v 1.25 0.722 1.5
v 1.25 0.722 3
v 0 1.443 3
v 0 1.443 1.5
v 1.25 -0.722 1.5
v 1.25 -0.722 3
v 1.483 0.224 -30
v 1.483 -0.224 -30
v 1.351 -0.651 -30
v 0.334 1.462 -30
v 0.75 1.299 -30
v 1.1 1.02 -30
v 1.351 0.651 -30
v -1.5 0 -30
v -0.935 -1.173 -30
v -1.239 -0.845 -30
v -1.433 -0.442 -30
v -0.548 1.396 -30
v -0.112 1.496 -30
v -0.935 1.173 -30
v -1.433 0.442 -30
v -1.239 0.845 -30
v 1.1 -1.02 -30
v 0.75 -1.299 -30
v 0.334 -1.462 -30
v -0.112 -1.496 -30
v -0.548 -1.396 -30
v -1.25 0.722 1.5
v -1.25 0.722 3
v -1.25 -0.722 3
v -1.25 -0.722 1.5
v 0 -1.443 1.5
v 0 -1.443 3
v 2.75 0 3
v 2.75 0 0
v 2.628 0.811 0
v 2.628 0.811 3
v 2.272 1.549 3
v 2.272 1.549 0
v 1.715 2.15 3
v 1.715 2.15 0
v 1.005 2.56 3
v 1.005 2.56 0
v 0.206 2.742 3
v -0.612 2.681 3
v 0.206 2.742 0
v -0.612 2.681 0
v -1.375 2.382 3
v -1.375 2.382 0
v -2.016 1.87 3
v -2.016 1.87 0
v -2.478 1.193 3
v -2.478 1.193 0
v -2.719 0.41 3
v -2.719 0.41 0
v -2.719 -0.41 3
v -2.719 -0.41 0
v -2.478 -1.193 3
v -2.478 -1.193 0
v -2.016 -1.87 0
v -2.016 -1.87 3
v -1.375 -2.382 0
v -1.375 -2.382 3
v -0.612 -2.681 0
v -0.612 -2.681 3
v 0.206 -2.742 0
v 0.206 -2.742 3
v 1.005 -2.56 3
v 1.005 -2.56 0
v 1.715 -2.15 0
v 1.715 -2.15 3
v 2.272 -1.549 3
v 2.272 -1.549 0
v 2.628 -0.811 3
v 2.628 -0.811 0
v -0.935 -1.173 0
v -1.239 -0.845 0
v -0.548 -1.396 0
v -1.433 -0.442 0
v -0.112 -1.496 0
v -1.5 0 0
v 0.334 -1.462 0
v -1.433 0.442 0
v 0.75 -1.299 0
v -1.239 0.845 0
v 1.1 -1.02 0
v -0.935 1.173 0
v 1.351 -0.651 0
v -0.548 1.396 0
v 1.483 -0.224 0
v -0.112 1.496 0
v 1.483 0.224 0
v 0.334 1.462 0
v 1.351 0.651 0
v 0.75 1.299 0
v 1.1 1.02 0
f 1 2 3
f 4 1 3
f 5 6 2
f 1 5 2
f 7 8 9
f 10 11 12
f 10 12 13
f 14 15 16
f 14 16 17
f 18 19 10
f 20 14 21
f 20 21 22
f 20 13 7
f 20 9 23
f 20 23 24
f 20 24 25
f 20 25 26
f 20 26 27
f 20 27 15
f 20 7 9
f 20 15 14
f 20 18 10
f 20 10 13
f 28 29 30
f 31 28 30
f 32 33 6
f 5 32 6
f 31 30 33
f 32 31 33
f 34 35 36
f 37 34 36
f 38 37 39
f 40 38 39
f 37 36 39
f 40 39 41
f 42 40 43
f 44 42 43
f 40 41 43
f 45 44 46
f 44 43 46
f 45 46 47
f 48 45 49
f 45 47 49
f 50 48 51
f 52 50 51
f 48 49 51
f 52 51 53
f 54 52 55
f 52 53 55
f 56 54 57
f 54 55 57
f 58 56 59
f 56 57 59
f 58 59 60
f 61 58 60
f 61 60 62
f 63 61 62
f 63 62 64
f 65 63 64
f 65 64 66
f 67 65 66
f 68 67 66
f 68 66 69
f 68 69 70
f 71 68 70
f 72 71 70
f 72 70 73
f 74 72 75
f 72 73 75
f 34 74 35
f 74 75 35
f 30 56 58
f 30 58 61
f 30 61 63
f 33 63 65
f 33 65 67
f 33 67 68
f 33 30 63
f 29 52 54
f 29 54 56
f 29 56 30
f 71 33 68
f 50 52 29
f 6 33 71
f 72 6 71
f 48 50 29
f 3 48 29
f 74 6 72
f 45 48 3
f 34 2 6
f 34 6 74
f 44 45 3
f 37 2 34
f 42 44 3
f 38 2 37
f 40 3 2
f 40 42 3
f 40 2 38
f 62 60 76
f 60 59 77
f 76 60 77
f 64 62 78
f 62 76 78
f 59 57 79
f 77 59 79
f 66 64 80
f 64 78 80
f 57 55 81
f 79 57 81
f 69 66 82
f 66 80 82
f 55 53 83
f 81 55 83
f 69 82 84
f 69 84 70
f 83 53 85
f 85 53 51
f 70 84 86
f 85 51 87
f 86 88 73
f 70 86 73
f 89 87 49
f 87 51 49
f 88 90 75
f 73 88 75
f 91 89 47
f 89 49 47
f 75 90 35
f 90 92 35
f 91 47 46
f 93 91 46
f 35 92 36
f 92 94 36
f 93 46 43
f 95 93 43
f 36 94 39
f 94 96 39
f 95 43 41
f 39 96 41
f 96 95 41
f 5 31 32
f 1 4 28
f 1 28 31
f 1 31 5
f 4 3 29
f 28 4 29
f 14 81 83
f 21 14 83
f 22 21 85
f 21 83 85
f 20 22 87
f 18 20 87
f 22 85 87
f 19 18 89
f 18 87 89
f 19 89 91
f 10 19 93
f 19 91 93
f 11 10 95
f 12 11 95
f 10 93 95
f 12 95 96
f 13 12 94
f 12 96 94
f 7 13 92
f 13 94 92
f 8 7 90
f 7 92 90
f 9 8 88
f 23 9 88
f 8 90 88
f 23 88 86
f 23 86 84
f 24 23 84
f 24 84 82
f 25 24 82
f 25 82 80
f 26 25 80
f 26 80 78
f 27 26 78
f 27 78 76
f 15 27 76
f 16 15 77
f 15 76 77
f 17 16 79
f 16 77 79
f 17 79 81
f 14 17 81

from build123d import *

# Parameters (mm, degrees)
SKETCH_1_R          = 2.75
EXTRUDE_1_DEPTH     = 3
CUT_EXTRUDE_1_DEPTH = 1.5
SKETCH_3_R          = 1.5
EXTRUDE_2_DEPTH     = 30


with BuildPart() as part:
    # 草图1 → 凸台-拉伸1 (new body)
    with BuildSketch(Plane.XY):
        Circle(SKETCH_1_R)
    extrude(amount=EXTRUDE_1_DEPTH)

    # 草图2 → 切除-拉伸1 (cut)
    with BuildSketch(Plane.XY.offset(3)):
        Polygon((0, -1.443375673), (1.25, -0.721687836), (1.25, 0.721687836), (0, 1.443375673), (-1.25, 0.721687836), (-1.25, -0.721687836), align=None)
    extrude(amount=-CUT_EXTRUDE_1_DEPTH, mode=Mode.SUBTRACT)

    # 草图3 → 凸台-拉伸2 (add)
    with BuildSketch(Plane(origin=(0, 0, 0), x_dir=(-1, 0, 0), z_dir=(0, 0, -1))):
        Circle(SKETCH_3_R)
    extrude(amount=EXTRUDE_2_DEPTH)


solid = part.part
